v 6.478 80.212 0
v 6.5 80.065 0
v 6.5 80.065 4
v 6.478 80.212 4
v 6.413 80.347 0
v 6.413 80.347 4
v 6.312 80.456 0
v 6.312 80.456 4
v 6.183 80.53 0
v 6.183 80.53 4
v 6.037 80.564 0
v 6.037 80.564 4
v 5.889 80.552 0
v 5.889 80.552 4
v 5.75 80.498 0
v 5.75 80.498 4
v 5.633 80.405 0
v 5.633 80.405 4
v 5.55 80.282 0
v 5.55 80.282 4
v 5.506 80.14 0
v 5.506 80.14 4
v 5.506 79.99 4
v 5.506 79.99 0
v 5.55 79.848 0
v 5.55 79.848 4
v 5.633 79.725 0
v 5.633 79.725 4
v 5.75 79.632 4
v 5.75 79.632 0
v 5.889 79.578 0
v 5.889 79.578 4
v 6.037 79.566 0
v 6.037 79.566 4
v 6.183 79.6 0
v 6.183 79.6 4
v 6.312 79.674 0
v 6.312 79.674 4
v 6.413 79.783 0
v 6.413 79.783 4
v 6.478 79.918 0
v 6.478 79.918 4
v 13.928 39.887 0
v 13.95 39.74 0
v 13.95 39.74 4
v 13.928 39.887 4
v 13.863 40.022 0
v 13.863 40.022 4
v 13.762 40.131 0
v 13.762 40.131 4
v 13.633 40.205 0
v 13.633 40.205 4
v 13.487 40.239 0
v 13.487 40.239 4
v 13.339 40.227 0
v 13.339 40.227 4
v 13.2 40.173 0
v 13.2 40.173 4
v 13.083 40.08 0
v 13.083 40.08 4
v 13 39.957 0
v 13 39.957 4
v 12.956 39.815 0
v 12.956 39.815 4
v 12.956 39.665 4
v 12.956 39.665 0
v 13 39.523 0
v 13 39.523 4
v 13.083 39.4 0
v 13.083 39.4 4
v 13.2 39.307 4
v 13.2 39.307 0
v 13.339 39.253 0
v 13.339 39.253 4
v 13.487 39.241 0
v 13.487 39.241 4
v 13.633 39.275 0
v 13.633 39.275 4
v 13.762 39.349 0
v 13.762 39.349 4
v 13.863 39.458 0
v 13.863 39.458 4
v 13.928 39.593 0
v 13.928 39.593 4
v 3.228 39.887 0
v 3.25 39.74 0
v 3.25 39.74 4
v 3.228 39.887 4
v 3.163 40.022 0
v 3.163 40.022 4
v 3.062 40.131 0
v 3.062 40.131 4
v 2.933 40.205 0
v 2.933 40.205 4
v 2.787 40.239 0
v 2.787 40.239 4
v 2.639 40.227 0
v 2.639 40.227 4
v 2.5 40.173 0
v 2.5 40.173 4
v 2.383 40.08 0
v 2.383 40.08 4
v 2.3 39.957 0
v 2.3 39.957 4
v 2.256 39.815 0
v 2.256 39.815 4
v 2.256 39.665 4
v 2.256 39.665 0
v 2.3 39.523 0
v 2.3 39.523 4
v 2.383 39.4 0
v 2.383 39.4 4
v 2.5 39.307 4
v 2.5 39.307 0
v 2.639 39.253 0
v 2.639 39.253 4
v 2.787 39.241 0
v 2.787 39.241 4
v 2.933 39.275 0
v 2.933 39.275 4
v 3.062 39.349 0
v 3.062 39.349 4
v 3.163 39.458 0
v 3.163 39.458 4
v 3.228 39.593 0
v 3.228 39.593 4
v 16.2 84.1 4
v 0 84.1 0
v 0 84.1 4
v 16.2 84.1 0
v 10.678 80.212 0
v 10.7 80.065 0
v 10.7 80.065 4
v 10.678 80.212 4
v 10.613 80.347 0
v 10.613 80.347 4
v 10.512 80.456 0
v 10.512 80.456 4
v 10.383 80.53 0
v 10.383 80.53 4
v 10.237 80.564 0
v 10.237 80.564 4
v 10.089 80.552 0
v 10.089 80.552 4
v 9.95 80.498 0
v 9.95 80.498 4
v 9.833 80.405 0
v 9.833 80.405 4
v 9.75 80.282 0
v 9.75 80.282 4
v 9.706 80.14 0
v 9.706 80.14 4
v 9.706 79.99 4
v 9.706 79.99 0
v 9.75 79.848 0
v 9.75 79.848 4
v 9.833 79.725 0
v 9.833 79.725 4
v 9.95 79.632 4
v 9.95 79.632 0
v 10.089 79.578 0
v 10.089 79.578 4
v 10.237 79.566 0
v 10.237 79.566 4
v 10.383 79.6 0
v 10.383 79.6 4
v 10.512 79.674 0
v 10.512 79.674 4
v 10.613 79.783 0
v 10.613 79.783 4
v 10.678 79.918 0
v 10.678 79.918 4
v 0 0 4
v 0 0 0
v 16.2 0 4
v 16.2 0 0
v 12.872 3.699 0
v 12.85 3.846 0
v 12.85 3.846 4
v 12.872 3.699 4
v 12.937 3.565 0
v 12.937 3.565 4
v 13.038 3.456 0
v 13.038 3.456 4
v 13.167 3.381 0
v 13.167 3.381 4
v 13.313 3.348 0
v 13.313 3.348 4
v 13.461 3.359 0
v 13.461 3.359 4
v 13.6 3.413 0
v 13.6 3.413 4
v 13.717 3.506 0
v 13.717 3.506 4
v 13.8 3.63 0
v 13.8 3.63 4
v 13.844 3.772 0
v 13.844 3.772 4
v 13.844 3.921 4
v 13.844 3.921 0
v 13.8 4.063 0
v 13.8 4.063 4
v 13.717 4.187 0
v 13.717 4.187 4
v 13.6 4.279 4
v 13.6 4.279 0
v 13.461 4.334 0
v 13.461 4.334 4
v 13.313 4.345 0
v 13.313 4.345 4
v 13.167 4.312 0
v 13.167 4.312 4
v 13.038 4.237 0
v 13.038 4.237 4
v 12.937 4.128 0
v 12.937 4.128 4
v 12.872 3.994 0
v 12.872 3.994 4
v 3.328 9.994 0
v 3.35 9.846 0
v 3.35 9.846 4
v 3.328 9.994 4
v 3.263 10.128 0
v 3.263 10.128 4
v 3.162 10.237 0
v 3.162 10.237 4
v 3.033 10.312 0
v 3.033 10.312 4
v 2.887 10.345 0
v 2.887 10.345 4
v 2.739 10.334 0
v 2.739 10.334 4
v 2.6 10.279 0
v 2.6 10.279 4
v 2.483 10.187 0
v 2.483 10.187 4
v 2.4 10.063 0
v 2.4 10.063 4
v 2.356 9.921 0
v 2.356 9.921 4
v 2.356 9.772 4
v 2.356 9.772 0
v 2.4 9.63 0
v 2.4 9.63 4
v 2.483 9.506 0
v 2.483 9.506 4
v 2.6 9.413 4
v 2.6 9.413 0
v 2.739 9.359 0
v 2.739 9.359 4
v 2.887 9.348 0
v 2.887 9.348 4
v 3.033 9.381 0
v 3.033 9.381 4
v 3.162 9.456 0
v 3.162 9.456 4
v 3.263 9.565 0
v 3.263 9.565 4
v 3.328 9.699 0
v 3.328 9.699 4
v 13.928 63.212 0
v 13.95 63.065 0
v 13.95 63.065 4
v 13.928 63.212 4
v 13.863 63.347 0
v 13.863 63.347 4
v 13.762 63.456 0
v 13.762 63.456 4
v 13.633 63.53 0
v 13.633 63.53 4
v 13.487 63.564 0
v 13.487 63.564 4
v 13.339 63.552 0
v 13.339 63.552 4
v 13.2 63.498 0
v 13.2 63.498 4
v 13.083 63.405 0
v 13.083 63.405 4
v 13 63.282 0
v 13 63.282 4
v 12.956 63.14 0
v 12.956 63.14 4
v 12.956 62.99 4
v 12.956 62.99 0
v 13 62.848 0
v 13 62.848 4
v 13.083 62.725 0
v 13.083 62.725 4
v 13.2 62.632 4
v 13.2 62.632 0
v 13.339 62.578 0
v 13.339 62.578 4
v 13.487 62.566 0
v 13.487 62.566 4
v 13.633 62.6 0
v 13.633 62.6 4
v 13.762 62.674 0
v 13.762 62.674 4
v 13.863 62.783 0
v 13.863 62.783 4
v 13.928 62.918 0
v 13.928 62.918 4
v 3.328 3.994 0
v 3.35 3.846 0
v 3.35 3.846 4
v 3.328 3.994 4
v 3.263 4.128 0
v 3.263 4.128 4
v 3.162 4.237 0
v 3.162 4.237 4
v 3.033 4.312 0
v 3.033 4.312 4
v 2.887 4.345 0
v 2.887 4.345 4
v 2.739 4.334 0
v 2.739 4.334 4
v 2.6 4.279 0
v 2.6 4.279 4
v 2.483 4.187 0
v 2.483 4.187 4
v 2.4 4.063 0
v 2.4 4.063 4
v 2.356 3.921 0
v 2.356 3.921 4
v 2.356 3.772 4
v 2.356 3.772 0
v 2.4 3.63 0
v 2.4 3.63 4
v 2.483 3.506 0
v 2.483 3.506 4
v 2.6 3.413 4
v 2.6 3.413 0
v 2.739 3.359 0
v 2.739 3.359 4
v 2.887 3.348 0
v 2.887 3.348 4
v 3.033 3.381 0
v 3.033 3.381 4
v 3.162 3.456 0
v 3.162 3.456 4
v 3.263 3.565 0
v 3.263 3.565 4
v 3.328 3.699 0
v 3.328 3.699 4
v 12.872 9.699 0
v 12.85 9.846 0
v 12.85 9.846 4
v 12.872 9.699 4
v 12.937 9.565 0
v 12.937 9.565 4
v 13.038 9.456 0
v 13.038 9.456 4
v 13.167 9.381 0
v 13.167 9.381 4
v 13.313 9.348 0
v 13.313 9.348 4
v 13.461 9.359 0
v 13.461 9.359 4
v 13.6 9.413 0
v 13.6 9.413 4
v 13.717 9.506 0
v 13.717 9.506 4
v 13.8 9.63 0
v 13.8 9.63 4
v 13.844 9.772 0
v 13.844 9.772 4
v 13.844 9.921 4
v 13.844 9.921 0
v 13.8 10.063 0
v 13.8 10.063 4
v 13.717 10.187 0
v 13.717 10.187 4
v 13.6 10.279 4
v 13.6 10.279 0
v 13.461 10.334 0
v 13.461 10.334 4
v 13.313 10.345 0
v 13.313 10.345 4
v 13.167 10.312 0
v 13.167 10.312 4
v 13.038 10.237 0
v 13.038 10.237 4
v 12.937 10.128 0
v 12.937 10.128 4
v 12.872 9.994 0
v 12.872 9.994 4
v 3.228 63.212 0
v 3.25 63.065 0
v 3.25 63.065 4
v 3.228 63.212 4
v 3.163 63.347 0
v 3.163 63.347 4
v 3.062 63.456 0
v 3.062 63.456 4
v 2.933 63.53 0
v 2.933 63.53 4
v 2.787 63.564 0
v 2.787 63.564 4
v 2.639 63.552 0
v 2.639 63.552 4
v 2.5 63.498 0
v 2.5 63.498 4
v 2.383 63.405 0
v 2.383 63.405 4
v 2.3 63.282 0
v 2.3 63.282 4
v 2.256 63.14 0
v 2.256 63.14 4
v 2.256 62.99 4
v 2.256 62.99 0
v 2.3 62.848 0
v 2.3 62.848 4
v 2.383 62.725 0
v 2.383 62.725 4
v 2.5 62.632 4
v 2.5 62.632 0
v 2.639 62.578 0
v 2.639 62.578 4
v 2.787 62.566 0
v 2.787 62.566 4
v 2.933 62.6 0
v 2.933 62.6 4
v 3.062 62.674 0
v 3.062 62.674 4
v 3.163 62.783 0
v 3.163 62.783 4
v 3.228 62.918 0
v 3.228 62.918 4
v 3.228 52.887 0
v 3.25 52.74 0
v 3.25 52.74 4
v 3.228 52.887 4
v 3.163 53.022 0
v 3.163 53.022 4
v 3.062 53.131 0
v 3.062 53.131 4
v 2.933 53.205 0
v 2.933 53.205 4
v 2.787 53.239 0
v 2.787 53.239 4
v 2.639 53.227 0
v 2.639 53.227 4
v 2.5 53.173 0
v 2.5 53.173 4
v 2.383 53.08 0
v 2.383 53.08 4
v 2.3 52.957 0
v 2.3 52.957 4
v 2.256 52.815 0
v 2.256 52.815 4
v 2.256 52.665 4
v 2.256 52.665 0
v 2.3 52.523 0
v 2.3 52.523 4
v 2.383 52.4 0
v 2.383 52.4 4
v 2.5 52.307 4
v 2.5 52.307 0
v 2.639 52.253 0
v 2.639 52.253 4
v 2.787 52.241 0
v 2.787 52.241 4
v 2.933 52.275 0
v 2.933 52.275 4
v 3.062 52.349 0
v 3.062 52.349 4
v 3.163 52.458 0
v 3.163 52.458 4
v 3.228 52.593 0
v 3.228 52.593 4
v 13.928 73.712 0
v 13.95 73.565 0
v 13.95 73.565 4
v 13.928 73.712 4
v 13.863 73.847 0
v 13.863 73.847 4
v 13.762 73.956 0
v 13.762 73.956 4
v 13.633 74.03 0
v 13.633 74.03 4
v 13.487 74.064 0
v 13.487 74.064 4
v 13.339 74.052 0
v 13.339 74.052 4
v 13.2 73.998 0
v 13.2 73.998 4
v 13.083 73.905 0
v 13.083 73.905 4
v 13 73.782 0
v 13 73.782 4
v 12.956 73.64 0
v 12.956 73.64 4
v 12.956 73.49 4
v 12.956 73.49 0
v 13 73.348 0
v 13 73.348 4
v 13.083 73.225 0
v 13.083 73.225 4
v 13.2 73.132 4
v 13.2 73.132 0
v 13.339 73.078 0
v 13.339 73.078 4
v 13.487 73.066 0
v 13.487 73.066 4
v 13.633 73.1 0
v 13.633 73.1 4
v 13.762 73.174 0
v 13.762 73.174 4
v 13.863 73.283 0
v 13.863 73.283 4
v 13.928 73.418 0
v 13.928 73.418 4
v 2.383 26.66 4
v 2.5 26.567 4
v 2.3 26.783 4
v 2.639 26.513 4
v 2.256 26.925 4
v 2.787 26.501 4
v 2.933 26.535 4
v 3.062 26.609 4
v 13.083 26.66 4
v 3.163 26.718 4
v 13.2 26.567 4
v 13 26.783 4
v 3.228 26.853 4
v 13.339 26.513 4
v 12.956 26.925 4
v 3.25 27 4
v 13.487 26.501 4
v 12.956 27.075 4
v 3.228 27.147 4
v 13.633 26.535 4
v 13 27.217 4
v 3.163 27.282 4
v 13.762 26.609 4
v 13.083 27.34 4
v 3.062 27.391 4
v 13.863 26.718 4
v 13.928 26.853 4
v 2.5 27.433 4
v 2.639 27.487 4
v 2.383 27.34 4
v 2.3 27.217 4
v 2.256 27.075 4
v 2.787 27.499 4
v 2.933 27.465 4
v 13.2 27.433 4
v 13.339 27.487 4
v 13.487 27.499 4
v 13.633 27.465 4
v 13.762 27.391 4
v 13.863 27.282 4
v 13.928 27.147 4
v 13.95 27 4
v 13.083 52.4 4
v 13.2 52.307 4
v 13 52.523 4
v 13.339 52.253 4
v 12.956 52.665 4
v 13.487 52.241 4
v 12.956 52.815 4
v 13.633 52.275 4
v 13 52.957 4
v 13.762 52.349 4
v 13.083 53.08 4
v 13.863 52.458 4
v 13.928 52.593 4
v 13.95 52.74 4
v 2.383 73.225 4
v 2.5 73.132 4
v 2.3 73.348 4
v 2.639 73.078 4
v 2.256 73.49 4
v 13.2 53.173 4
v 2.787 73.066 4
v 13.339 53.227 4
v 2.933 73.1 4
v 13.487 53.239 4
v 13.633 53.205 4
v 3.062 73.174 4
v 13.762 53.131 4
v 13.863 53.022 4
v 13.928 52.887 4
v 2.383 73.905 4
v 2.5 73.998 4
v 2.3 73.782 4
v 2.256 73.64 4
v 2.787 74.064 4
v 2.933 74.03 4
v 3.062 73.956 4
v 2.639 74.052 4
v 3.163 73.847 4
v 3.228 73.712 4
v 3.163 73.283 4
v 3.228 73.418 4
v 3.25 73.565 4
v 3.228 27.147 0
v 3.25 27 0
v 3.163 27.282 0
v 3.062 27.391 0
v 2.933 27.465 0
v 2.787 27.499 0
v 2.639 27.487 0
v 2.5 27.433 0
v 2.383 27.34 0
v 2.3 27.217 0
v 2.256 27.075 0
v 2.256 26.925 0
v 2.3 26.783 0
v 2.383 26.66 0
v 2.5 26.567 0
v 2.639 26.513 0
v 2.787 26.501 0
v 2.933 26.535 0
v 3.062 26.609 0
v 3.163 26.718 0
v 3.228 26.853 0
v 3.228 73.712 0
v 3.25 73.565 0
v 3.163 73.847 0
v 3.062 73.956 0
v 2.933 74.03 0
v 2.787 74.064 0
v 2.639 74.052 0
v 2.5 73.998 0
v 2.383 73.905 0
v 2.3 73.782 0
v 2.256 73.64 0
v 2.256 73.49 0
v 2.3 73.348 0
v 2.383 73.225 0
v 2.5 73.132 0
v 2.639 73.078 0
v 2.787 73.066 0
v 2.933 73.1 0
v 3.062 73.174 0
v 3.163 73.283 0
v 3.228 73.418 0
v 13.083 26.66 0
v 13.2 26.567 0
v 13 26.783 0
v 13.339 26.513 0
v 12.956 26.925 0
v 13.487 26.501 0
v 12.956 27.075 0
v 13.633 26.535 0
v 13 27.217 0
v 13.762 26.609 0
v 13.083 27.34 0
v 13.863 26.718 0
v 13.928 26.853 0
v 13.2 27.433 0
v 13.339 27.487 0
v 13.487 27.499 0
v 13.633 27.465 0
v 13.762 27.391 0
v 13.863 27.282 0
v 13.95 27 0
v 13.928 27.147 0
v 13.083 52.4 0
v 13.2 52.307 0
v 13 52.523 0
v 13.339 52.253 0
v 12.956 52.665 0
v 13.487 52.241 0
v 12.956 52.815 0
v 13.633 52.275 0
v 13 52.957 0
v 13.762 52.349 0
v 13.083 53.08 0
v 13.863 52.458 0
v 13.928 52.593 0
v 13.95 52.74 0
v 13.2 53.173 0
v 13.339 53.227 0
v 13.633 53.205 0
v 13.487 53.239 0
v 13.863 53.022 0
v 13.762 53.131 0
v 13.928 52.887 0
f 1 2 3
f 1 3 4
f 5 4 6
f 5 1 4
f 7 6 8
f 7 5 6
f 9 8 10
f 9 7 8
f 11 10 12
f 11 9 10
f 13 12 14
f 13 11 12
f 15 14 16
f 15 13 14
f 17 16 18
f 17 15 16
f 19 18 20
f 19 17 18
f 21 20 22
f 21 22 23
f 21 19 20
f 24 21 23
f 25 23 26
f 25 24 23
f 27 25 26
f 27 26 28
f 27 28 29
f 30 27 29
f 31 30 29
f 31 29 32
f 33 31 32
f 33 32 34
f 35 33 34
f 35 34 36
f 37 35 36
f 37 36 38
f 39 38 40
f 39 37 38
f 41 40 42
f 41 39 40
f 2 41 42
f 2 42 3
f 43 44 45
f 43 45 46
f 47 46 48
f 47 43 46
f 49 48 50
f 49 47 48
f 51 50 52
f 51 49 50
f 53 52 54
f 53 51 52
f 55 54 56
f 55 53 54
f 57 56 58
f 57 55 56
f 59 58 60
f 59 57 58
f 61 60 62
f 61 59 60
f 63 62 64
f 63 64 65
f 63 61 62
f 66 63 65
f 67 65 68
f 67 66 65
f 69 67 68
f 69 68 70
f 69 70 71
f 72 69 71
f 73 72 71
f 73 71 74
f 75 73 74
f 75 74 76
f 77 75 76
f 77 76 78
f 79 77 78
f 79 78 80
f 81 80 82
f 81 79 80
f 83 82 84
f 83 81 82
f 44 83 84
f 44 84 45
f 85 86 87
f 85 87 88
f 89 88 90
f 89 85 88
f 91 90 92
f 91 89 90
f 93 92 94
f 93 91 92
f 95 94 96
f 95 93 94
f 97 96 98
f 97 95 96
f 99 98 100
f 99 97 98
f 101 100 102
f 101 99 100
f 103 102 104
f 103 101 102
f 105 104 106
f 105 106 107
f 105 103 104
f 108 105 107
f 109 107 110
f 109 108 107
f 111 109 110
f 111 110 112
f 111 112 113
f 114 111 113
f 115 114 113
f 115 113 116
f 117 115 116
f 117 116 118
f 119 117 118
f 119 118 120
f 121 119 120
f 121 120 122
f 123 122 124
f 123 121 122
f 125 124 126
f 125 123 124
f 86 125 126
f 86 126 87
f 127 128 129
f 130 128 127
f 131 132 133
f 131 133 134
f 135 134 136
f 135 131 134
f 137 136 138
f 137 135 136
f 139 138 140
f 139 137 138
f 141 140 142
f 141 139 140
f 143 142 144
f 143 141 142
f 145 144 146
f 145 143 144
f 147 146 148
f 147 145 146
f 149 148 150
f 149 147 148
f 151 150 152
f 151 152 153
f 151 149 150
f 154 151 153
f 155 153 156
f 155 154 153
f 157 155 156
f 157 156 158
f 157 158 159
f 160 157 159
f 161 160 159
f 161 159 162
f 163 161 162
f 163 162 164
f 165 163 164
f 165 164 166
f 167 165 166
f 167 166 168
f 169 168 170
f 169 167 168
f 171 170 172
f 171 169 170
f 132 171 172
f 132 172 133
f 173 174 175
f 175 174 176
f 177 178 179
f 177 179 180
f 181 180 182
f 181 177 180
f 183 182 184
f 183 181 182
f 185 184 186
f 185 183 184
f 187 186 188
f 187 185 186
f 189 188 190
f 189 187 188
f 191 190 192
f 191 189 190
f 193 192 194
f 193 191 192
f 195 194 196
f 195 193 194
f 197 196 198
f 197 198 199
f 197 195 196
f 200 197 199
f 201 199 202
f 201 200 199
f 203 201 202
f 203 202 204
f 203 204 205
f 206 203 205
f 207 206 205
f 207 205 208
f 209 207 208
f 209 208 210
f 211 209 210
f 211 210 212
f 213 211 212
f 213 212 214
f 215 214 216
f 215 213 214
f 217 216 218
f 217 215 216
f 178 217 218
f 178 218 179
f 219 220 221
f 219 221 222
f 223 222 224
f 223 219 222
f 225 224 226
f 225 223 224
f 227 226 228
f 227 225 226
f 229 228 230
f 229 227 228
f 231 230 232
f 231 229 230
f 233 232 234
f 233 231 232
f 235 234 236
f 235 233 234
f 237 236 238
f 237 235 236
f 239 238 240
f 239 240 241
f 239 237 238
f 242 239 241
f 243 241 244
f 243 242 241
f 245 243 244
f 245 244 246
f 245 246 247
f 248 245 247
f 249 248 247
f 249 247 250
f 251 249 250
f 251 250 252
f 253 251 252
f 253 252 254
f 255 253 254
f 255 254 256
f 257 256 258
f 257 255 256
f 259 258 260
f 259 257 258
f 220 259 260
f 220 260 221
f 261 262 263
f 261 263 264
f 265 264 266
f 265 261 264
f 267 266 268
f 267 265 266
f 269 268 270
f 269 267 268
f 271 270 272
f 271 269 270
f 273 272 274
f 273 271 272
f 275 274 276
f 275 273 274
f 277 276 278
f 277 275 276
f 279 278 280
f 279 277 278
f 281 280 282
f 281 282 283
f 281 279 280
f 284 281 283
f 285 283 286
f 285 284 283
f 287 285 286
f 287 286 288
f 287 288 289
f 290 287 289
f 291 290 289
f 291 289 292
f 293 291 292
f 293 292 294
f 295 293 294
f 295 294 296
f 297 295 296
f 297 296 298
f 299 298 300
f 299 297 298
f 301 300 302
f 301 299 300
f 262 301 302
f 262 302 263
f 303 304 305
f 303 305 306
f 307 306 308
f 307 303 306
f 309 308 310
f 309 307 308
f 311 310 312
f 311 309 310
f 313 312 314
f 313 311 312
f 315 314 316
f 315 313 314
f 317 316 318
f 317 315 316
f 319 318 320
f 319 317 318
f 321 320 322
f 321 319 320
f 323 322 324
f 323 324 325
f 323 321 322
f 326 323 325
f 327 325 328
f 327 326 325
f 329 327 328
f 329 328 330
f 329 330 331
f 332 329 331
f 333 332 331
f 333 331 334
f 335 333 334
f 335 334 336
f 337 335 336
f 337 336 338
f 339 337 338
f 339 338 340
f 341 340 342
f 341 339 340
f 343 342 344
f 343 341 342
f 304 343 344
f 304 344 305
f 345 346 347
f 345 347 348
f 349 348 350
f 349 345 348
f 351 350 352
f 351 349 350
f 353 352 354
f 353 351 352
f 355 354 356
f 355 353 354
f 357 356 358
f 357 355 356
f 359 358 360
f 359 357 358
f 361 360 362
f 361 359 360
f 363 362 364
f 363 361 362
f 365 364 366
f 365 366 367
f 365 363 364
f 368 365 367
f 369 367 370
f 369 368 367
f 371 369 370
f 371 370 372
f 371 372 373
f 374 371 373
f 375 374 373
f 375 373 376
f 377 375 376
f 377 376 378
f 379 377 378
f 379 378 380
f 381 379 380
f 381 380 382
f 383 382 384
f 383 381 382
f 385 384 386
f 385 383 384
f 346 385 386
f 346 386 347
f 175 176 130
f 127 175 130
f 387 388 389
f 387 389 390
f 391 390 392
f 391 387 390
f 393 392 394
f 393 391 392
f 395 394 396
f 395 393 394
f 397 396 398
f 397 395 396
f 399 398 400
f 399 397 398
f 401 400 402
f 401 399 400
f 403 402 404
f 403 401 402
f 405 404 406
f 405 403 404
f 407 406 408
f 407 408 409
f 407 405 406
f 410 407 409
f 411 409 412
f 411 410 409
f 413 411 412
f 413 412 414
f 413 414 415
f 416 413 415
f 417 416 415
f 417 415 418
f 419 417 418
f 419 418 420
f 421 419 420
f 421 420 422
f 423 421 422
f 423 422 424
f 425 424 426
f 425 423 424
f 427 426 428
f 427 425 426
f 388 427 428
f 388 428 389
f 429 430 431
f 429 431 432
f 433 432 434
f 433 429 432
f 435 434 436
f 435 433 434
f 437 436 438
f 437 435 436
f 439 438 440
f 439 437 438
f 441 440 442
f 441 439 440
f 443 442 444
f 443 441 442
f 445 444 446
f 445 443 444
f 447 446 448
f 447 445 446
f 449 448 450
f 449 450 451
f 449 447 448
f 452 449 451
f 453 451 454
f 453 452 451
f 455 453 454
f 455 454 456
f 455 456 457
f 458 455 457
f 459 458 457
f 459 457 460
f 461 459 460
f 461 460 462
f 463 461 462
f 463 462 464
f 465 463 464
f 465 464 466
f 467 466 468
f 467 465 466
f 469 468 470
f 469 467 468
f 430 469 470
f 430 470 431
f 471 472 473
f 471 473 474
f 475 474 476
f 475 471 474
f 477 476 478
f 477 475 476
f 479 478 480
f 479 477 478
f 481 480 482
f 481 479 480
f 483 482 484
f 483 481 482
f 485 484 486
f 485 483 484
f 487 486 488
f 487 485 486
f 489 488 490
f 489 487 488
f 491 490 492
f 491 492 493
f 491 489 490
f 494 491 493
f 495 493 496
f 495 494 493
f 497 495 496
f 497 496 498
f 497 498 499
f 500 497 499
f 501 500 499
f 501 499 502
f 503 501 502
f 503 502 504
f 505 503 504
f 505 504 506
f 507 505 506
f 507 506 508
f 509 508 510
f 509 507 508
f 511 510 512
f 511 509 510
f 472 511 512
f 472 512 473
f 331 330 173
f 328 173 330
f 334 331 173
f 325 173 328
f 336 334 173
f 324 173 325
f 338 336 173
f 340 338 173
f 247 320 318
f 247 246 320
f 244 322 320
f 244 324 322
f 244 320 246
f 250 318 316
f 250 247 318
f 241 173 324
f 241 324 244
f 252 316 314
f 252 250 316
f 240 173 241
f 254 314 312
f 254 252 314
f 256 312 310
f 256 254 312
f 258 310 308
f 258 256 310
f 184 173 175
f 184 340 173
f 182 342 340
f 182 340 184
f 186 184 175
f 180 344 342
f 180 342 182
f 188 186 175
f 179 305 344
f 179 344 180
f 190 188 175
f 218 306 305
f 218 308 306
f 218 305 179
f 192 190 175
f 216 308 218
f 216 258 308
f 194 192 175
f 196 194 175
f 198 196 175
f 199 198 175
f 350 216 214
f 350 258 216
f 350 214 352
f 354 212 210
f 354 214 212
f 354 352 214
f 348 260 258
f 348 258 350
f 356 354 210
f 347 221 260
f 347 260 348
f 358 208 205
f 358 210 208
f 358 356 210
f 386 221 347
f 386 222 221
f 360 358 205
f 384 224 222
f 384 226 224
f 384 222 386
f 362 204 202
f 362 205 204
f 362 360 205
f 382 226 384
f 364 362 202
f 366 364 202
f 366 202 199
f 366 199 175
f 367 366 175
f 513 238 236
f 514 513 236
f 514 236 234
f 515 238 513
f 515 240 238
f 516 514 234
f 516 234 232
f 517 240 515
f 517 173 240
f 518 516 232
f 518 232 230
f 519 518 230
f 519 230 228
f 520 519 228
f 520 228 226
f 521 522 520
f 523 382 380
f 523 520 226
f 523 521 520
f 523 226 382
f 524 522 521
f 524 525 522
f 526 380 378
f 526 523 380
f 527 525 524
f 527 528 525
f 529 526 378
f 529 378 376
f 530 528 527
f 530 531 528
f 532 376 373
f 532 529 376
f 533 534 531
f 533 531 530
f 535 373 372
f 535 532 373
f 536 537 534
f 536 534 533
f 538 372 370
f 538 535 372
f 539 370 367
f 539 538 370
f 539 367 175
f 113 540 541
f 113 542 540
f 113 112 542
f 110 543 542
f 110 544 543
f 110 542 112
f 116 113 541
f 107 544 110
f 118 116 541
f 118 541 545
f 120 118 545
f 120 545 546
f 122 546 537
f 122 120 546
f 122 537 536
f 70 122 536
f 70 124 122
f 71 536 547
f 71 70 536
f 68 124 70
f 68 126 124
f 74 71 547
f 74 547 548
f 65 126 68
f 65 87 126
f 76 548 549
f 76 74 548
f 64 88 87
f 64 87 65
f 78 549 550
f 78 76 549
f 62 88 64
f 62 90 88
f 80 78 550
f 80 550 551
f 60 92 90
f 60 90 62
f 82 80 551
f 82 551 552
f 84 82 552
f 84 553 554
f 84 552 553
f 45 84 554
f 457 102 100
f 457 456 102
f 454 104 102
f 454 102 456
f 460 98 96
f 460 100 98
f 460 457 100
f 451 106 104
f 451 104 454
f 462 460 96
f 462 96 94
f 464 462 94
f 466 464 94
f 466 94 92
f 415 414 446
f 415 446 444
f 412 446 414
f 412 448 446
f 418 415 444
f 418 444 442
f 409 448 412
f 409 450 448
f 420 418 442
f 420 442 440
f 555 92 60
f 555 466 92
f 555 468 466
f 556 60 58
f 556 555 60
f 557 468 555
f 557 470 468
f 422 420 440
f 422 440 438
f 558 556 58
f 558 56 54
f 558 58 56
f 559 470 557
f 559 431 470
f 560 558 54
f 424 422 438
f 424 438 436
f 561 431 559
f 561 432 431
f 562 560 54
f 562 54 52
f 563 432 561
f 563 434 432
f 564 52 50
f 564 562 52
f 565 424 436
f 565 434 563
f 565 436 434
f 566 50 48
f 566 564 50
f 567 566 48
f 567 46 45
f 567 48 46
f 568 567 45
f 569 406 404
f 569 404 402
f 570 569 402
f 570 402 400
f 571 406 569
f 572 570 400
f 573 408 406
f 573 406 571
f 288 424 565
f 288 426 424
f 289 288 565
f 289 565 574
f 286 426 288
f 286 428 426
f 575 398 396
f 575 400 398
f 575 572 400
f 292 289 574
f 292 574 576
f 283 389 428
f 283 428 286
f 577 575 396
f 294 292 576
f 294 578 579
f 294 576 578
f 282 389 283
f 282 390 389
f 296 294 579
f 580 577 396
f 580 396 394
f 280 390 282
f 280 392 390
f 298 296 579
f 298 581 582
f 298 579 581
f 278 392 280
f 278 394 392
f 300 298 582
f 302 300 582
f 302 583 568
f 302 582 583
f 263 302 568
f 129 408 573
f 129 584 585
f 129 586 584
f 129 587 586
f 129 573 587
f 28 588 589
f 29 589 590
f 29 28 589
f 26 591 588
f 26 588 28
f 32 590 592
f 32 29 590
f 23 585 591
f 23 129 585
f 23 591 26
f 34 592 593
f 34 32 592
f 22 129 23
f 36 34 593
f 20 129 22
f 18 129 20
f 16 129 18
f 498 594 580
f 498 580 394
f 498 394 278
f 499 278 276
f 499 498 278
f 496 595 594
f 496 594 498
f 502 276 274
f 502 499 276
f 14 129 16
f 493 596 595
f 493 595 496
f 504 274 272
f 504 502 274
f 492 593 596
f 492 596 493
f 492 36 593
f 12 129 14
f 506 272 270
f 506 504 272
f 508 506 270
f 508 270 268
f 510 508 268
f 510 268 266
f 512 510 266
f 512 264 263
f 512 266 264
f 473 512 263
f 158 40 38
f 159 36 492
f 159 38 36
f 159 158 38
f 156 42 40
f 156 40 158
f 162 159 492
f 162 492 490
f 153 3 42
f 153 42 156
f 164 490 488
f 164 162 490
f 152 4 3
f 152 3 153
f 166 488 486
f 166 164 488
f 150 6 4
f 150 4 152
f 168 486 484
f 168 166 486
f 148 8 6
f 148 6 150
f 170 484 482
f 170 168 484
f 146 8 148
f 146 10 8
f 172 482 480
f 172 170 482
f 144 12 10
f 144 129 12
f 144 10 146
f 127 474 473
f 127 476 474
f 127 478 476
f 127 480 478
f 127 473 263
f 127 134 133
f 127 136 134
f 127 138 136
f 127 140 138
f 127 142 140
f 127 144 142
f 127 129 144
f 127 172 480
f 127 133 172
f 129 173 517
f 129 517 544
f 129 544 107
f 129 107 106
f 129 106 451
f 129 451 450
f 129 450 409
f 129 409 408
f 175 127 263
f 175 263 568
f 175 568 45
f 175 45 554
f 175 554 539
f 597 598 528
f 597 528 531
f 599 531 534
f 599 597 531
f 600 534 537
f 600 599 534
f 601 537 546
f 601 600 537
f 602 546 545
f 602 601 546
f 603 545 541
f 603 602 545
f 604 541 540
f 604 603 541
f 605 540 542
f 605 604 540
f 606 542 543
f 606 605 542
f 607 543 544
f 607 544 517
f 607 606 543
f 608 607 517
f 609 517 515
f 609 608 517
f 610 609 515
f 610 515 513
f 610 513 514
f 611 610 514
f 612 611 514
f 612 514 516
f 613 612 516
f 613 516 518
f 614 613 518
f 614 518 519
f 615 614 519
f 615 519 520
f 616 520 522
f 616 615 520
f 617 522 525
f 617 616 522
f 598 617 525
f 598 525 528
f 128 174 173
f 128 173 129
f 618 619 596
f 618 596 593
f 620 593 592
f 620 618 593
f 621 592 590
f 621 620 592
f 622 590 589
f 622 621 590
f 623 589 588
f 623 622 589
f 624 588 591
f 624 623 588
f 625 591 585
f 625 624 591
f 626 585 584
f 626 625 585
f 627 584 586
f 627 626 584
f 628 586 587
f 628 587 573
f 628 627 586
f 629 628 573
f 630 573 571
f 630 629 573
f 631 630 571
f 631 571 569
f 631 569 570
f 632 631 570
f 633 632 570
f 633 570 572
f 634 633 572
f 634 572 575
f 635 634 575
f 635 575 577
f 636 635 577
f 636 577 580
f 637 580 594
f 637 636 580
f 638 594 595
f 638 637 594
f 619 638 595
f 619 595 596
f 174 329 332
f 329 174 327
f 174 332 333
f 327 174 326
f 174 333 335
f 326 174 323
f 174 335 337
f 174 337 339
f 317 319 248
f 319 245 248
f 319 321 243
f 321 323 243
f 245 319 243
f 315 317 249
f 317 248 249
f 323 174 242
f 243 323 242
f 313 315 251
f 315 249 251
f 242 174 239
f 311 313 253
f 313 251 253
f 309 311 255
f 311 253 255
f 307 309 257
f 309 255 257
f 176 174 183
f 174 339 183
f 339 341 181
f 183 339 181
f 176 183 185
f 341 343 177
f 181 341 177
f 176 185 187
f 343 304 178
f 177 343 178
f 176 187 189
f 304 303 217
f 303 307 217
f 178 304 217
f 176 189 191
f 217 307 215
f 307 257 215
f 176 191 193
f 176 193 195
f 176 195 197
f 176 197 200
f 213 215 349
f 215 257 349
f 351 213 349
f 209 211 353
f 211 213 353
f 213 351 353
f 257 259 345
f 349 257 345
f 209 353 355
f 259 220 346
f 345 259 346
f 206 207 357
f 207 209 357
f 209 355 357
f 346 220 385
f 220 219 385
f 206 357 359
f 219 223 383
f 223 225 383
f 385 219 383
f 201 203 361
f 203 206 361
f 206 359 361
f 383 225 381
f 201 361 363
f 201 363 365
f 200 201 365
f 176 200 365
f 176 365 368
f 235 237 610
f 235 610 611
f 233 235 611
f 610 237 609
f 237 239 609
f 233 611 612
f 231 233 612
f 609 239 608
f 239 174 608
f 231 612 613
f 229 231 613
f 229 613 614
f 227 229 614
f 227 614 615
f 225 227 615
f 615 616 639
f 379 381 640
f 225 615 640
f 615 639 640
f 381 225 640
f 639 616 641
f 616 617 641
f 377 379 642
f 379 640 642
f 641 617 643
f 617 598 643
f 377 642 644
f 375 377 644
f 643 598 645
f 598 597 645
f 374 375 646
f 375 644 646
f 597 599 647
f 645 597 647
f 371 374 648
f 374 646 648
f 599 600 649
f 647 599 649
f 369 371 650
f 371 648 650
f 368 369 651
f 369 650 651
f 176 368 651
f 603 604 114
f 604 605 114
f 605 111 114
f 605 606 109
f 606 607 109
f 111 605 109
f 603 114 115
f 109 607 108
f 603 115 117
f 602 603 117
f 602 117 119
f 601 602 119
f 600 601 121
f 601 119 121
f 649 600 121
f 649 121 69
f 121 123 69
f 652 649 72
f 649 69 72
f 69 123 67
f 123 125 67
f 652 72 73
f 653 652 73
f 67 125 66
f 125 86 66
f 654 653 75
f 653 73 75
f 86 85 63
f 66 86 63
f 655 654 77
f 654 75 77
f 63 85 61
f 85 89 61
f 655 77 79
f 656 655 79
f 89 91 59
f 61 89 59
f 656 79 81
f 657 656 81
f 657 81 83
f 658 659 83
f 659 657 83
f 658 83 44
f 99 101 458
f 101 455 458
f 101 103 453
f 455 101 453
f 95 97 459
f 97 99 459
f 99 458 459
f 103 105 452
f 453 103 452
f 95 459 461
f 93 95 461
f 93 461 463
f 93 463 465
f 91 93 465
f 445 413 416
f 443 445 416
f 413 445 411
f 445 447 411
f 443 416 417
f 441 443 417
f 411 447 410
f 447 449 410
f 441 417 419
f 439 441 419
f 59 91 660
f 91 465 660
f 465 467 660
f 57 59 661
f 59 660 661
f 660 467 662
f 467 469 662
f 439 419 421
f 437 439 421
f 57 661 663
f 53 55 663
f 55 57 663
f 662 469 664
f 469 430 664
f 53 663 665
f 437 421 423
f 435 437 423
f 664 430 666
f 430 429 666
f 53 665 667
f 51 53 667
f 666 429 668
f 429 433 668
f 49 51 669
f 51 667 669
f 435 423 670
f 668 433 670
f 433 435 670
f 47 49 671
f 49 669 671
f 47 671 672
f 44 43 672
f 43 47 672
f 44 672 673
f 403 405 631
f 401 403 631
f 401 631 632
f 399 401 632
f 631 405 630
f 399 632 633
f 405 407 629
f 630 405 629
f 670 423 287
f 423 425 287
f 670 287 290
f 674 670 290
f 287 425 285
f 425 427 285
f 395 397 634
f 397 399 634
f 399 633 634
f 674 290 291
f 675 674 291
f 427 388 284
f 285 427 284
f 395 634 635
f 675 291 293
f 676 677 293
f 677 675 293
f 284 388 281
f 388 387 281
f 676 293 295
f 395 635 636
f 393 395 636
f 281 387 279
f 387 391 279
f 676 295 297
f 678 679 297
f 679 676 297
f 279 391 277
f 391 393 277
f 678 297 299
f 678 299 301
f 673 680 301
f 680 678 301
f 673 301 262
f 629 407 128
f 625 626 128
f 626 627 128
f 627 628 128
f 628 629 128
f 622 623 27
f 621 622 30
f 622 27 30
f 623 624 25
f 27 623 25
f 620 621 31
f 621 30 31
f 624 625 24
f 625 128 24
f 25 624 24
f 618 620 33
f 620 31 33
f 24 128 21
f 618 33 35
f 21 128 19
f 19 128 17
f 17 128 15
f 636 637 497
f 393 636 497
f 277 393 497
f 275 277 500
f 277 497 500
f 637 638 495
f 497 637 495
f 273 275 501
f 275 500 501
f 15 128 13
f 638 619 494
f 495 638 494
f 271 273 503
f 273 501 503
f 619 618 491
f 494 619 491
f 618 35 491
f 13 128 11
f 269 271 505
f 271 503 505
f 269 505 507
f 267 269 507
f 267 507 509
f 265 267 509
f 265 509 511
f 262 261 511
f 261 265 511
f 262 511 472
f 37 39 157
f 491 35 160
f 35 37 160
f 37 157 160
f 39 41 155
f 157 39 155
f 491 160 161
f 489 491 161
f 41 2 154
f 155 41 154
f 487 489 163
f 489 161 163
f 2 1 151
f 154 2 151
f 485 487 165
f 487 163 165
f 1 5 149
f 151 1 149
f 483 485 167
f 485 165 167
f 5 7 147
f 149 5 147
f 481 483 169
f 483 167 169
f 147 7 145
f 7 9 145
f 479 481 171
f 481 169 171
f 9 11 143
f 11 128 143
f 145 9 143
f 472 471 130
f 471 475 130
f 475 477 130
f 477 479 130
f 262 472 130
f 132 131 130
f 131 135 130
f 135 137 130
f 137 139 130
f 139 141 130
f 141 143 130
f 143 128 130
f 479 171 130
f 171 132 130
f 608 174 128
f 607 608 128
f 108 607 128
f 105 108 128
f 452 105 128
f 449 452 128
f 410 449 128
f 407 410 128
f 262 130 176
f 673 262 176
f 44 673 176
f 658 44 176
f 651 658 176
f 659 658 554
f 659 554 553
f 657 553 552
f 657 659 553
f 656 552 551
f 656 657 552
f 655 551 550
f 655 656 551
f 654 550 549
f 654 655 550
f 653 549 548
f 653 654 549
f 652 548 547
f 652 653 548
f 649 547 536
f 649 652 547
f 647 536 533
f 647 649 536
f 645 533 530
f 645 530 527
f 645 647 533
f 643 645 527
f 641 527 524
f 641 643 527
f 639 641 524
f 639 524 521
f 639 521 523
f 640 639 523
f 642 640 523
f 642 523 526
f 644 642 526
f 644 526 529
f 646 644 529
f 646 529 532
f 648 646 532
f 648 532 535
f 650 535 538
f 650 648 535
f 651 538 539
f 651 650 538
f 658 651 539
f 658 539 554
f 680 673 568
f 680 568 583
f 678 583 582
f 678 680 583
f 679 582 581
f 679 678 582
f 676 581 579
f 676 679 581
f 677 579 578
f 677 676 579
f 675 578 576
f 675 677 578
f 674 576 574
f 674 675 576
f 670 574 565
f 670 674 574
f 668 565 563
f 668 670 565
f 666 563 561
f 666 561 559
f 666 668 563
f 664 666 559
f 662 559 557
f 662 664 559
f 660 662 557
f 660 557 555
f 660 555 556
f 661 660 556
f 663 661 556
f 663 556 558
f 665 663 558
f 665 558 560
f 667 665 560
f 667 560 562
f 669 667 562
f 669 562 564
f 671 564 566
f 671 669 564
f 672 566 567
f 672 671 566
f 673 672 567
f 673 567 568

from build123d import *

# Parameters (mm, degrees)
SKETCH1_W           = 16.2
SKETCH1_H           = 84.1
SKETCH1_R           = 0.5
BOSS_EXTRUDE1_DEPTH = 4


with BuildPart() as part:
    # Sketch1 → Boss-Extrude1 (new body)
    with BuildSketch(Plane.XY):
        with Locations((8.1, 42.05)):
            Rectangle(SKETCH1_W, SKETCH1_H)
        with Locations((13.45, 39.74)):
            Circle(SKETCH1_R, mode=Mode.SUBTRACT)
        with Locations((2.75, 63.065)):
            Circle(SKETCH1_R, mode=Mode.SUBTRACT)
        with Locations((13.45, 52.74)):
            Circle(SKETCH1_R, mode=Mode.SUBTRACT)
        with Locations((13.45, 73.565)):
            Circle(SKETCH1_R, mode=Mode.SUBTRACT)
        with Locations((2.75, 27)):
            Circle(SKETCH1_R, mode=Mode.SUBTRACT)
        with Locations((2.75, 73.565)):
            Circle(SKETCH1_R, mode=Mode.SUBTRACT)
        with Locations((2.75, 52.74)):
            Circle(SKETCH1_R, mode=Mode.SUBTRACT)
        with Locations((2.85, 9.846448831)):
            Circle(SKETCH1_R, mode=Mode.SUBTRACT)
        with Locations(Location((13.35, 9.846448831, 0), (0, 0, 180))):
            Circle(SKETCH1_R, mode=Mode.SUBTRACT)
        with Locations(Location((13.35, 3.846448831, 0), (0, 0, 180))):
            Circle(SKETCH1_R, mode=Mode.SUBTRACT)
        with Locations((2.85, 3.846448831)):
            Circle(SKETCH1_R, mode=Mode.SUBTRACT)
        with Locations((6, 80.065)):
            Circle(SKETCH1_R, mode=Mode.SUBTRACT)
        with Locations((13.45, 27)):
            Circle(SKETCH1_R, mode=Mode.SUBTRACT)
        with Locations((13.45, 63.065)):
            Circle(SKETCH1_R, mode=Mode.SUBTRACT)
        with Locations((10.2, 80.065)):
            Circle(SKETCH1_R, mode=Mode.SUBTRACT)
        with Locations((2.75, 39.74)):
            Circle(SKETCH1_R, mode=Mode.SUBTRACT)
    extrude(amount=BOSS_EXTRUDE1_DEPTH)


solid = part.part
